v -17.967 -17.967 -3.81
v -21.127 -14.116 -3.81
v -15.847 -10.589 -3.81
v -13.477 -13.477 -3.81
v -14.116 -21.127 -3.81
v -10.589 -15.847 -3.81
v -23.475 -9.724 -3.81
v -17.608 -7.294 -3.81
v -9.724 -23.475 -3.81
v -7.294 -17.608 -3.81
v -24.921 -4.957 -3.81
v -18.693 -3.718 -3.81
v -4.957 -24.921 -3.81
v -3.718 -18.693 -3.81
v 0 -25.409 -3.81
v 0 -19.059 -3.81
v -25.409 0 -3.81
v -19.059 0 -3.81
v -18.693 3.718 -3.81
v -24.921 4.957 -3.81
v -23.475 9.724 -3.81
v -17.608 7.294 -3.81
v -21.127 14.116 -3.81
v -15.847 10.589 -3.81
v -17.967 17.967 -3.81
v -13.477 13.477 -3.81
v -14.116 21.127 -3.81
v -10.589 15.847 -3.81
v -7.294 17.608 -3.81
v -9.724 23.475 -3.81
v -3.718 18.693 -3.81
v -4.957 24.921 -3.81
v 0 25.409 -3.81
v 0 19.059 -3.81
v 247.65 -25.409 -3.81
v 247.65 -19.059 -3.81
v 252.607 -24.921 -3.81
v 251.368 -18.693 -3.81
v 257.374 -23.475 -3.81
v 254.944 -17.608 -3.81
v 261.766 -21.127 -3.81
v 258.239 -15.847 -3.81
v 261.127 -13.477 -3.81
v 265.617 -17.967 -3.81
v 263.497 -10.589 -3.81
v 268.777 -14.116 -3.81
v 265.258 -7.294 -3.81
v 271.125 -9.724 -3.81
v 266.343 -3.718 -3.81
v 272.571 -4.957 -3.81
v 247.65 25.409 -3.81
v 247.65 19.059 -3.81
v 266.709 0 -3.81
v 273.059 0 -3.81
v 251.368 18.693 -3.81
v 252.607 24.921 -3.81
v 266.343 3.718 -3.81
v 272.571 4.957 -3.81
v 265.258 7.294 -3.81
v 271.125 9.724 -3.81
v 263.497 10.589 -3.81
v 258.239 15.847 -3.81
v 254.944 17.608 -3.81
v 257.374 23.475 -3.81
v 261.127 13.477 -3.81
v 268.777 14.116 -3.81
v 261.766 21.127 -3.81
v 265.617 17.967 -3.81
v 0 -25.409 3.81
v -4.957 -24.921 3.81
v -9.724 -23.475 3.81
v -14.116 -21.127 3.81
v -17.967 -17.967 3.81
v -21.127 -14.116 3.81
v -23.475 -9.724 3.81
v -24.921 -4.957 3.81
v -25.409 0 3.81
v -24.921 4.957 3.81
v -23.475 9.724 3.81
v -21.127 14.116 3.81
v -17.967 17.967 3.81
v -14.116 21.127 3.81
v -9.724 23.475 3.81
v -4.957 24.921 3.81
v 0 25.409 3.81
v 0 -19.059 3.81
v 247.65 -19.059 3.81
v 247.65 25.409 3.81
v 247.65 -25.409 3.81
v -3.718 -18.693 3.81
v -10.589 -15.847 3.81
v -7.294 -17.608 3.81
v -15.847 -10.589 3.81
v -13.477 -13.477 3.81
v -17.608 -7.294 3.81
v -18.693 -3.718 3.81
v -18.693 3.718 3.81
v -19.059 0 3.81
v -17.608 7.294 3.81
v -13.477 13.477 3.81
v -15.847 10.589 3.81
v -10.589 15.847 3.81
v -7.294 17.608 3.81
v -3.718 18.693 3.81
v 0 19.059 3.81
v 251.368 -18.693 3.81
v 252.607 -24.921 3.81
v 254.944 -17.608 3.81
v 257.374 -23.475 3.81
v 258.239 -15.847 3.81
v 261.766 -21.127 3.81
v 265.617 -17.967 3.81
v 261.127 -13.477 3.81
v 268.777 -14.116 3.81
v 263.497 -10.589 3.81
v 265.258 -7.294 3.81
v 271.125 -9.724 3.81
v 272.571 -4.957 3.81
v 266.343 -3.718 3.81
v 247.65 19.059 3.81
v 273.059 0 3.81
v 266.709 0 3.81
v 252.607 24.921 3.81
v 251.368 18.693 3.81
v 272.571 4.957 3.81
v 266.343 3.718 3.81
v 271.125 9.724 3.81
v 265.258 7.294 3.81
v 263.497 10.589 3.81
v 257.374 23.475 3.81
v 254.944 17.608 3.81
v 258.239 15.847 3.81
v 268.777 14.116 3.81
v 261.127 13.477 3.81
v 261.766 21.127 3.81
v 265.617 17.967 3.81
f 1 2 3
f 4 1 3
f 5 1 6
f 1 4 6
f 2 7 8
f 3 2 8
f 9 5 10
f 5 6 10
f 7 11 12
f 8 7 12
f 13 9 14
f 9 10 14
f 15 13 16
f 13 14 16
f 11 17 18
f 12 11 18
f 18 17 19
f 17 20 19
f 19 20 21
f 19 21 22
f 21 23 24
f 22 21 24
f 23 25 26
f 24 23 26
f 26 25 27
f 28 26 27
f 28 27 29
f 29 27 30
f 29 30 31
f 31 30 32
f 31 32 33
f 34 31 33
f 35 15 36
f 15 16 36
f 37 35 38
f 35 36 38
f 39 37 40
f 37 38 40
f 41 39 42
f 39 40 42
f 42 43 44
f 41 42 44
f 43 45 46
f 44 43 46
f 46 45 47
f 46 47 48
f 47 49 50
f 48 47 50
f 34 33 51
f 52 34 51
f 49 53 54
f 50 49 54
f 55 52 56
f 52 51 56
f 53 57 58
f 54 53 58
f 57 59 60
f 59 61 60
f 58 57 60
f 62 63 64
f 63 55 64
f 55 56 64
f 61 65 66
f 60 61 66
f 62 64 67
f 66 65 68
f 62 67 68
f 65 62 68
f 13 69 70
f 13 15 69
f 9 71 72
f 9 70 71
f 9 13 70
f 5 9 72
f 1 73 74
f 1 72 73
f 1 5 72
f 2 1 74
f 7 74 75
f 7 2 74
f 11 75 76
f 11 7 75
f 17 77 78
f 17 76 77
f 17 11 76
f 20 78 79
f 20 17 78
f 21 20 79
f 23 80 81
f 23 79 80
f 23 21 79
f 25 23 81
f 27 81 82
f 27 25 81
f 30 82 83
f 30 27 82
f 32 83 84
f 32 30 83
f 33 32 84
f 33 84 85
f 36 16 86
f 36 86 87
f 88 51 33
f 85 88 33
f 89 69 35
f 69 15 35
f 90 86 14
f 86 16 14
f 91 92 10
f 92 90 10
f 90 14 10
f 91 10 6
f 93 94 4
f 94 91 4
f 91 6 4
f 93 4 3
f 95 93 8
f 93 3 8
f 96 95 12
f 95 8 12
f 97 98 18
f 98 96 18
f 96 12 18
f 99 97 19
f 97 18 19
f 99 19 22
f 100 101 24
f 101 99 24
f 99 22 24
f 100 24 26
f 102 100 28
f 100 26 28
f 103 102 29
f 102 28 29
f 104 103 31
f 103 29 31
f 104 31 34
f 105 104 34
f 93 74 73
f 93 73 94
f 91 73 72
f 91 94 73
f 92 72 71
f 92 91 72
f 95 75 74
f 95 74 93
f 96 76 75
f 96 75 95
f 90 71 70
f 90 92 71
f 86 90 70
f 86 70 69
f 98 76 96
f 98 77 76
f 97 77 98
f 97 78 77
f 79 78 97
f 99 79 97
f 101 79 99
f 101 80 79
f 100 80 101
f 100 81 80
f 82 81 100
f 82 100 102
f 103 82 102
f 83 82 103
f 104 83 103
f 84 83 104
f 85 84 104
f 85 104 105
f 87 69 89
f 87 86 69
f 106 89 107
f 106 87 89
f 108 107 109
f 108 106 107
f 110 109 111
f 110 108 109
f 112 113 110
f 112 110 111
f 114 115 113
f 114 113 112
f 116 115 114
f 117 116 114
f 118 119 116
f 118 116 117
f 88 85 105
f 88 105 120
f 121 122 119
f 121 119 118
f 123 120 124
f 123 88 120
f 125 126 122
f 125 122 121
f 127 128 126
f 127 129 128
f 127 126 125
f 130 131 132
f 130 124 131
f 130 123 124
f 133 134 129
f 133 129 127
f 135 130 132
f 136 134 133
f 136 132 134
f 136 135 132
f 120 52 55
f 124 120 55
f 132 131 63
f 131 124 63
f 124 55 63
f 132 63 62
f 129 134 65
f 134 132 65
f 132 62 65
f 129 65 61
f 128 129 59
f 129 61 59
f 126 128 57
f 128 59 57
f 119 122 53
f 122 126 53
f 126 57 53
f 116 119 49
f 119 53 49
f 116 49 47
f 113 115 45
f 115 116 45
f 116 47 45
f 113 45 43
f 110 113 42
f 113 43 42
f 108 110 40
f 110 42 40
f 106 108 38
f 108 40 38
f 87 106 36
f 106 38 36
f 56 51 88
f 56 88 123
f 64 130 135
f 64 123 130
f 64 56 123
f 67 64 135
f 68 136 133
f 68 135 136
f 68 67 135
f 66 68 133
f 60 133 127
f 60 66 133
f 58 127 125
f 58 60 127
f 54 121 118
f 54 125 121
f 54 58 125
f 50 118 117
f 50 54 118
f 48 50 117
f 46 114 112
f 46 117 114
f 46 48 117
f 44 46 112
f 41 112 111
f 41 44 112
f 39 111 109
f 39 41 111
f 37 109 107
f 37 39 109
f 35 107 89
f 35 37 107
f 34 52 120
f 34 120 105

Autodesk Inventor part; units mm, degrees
ref_plane "YZ Plane" through (0, 0, 0) normal (1, 0, 0) x (0, 1, 0)
ref_plane "XZ Plane" through (0, 0, 0) normal (0, 1, 0) x (-1, 0, 0)
ref_plane "XY Plane" through (0, 0, 0) normal (0, 0, 1) x (1, 0, 0)
sketch "Sketch1" plane through (0, 0, 0) normal (0, 0, 1) x (1, 0, 0)
  line L0 (0, 22.2339) -> (247.65, 22.2339) construction
  line L1 (0, -22.2339) -> (247.65, -22.2339) construction
  arc A0 (0, 22.2339) -> (0, -22.2339) centre (0, 0) ccw construction
  line L2 (0, 0) -> (247.65, 0) construction
  arc A1 (247.65, -22.2339) -> (247.65, 22.2339) centre (247.65, 0) ccw construction
  line L3 (247.65, 25.4089) -> (0, 25.4089)
  arc A2 (0, 25.4089) -> (0, -25.4089) centre (0, 0) ccw
  line L4 (0, -25.4089) -> (247.65, -25.4089)
  arc A3 (247.65, -25.4089) -> (247.65, 25.4089) centre (247.65, 0) ccw
  line L5 (247.65, 19.0589) -> (0, 19.0589)
  arc A4 (0, 19.0589) -> (0, -19.0589) centre (0, 0) ccw
  line L6 (0, -19.0589) -> (247.65, -19.0589)
  arc A5 (247.65, -19.0589) -> (247.65, 19.0589) centre (247.65, 0) ccw
  dimension "d1" = 22.234
  dimension "d2" = 22.234
  dimension "d3" = 3.175
  dimension "d4" = 3.175
  dimension "CtoC" = 247.65
extrude "Extrusion1" add sketch "Sketch1" along normal mid plane 7.62
properties part number "25 Chain Template" material "Silicon Nitride"
